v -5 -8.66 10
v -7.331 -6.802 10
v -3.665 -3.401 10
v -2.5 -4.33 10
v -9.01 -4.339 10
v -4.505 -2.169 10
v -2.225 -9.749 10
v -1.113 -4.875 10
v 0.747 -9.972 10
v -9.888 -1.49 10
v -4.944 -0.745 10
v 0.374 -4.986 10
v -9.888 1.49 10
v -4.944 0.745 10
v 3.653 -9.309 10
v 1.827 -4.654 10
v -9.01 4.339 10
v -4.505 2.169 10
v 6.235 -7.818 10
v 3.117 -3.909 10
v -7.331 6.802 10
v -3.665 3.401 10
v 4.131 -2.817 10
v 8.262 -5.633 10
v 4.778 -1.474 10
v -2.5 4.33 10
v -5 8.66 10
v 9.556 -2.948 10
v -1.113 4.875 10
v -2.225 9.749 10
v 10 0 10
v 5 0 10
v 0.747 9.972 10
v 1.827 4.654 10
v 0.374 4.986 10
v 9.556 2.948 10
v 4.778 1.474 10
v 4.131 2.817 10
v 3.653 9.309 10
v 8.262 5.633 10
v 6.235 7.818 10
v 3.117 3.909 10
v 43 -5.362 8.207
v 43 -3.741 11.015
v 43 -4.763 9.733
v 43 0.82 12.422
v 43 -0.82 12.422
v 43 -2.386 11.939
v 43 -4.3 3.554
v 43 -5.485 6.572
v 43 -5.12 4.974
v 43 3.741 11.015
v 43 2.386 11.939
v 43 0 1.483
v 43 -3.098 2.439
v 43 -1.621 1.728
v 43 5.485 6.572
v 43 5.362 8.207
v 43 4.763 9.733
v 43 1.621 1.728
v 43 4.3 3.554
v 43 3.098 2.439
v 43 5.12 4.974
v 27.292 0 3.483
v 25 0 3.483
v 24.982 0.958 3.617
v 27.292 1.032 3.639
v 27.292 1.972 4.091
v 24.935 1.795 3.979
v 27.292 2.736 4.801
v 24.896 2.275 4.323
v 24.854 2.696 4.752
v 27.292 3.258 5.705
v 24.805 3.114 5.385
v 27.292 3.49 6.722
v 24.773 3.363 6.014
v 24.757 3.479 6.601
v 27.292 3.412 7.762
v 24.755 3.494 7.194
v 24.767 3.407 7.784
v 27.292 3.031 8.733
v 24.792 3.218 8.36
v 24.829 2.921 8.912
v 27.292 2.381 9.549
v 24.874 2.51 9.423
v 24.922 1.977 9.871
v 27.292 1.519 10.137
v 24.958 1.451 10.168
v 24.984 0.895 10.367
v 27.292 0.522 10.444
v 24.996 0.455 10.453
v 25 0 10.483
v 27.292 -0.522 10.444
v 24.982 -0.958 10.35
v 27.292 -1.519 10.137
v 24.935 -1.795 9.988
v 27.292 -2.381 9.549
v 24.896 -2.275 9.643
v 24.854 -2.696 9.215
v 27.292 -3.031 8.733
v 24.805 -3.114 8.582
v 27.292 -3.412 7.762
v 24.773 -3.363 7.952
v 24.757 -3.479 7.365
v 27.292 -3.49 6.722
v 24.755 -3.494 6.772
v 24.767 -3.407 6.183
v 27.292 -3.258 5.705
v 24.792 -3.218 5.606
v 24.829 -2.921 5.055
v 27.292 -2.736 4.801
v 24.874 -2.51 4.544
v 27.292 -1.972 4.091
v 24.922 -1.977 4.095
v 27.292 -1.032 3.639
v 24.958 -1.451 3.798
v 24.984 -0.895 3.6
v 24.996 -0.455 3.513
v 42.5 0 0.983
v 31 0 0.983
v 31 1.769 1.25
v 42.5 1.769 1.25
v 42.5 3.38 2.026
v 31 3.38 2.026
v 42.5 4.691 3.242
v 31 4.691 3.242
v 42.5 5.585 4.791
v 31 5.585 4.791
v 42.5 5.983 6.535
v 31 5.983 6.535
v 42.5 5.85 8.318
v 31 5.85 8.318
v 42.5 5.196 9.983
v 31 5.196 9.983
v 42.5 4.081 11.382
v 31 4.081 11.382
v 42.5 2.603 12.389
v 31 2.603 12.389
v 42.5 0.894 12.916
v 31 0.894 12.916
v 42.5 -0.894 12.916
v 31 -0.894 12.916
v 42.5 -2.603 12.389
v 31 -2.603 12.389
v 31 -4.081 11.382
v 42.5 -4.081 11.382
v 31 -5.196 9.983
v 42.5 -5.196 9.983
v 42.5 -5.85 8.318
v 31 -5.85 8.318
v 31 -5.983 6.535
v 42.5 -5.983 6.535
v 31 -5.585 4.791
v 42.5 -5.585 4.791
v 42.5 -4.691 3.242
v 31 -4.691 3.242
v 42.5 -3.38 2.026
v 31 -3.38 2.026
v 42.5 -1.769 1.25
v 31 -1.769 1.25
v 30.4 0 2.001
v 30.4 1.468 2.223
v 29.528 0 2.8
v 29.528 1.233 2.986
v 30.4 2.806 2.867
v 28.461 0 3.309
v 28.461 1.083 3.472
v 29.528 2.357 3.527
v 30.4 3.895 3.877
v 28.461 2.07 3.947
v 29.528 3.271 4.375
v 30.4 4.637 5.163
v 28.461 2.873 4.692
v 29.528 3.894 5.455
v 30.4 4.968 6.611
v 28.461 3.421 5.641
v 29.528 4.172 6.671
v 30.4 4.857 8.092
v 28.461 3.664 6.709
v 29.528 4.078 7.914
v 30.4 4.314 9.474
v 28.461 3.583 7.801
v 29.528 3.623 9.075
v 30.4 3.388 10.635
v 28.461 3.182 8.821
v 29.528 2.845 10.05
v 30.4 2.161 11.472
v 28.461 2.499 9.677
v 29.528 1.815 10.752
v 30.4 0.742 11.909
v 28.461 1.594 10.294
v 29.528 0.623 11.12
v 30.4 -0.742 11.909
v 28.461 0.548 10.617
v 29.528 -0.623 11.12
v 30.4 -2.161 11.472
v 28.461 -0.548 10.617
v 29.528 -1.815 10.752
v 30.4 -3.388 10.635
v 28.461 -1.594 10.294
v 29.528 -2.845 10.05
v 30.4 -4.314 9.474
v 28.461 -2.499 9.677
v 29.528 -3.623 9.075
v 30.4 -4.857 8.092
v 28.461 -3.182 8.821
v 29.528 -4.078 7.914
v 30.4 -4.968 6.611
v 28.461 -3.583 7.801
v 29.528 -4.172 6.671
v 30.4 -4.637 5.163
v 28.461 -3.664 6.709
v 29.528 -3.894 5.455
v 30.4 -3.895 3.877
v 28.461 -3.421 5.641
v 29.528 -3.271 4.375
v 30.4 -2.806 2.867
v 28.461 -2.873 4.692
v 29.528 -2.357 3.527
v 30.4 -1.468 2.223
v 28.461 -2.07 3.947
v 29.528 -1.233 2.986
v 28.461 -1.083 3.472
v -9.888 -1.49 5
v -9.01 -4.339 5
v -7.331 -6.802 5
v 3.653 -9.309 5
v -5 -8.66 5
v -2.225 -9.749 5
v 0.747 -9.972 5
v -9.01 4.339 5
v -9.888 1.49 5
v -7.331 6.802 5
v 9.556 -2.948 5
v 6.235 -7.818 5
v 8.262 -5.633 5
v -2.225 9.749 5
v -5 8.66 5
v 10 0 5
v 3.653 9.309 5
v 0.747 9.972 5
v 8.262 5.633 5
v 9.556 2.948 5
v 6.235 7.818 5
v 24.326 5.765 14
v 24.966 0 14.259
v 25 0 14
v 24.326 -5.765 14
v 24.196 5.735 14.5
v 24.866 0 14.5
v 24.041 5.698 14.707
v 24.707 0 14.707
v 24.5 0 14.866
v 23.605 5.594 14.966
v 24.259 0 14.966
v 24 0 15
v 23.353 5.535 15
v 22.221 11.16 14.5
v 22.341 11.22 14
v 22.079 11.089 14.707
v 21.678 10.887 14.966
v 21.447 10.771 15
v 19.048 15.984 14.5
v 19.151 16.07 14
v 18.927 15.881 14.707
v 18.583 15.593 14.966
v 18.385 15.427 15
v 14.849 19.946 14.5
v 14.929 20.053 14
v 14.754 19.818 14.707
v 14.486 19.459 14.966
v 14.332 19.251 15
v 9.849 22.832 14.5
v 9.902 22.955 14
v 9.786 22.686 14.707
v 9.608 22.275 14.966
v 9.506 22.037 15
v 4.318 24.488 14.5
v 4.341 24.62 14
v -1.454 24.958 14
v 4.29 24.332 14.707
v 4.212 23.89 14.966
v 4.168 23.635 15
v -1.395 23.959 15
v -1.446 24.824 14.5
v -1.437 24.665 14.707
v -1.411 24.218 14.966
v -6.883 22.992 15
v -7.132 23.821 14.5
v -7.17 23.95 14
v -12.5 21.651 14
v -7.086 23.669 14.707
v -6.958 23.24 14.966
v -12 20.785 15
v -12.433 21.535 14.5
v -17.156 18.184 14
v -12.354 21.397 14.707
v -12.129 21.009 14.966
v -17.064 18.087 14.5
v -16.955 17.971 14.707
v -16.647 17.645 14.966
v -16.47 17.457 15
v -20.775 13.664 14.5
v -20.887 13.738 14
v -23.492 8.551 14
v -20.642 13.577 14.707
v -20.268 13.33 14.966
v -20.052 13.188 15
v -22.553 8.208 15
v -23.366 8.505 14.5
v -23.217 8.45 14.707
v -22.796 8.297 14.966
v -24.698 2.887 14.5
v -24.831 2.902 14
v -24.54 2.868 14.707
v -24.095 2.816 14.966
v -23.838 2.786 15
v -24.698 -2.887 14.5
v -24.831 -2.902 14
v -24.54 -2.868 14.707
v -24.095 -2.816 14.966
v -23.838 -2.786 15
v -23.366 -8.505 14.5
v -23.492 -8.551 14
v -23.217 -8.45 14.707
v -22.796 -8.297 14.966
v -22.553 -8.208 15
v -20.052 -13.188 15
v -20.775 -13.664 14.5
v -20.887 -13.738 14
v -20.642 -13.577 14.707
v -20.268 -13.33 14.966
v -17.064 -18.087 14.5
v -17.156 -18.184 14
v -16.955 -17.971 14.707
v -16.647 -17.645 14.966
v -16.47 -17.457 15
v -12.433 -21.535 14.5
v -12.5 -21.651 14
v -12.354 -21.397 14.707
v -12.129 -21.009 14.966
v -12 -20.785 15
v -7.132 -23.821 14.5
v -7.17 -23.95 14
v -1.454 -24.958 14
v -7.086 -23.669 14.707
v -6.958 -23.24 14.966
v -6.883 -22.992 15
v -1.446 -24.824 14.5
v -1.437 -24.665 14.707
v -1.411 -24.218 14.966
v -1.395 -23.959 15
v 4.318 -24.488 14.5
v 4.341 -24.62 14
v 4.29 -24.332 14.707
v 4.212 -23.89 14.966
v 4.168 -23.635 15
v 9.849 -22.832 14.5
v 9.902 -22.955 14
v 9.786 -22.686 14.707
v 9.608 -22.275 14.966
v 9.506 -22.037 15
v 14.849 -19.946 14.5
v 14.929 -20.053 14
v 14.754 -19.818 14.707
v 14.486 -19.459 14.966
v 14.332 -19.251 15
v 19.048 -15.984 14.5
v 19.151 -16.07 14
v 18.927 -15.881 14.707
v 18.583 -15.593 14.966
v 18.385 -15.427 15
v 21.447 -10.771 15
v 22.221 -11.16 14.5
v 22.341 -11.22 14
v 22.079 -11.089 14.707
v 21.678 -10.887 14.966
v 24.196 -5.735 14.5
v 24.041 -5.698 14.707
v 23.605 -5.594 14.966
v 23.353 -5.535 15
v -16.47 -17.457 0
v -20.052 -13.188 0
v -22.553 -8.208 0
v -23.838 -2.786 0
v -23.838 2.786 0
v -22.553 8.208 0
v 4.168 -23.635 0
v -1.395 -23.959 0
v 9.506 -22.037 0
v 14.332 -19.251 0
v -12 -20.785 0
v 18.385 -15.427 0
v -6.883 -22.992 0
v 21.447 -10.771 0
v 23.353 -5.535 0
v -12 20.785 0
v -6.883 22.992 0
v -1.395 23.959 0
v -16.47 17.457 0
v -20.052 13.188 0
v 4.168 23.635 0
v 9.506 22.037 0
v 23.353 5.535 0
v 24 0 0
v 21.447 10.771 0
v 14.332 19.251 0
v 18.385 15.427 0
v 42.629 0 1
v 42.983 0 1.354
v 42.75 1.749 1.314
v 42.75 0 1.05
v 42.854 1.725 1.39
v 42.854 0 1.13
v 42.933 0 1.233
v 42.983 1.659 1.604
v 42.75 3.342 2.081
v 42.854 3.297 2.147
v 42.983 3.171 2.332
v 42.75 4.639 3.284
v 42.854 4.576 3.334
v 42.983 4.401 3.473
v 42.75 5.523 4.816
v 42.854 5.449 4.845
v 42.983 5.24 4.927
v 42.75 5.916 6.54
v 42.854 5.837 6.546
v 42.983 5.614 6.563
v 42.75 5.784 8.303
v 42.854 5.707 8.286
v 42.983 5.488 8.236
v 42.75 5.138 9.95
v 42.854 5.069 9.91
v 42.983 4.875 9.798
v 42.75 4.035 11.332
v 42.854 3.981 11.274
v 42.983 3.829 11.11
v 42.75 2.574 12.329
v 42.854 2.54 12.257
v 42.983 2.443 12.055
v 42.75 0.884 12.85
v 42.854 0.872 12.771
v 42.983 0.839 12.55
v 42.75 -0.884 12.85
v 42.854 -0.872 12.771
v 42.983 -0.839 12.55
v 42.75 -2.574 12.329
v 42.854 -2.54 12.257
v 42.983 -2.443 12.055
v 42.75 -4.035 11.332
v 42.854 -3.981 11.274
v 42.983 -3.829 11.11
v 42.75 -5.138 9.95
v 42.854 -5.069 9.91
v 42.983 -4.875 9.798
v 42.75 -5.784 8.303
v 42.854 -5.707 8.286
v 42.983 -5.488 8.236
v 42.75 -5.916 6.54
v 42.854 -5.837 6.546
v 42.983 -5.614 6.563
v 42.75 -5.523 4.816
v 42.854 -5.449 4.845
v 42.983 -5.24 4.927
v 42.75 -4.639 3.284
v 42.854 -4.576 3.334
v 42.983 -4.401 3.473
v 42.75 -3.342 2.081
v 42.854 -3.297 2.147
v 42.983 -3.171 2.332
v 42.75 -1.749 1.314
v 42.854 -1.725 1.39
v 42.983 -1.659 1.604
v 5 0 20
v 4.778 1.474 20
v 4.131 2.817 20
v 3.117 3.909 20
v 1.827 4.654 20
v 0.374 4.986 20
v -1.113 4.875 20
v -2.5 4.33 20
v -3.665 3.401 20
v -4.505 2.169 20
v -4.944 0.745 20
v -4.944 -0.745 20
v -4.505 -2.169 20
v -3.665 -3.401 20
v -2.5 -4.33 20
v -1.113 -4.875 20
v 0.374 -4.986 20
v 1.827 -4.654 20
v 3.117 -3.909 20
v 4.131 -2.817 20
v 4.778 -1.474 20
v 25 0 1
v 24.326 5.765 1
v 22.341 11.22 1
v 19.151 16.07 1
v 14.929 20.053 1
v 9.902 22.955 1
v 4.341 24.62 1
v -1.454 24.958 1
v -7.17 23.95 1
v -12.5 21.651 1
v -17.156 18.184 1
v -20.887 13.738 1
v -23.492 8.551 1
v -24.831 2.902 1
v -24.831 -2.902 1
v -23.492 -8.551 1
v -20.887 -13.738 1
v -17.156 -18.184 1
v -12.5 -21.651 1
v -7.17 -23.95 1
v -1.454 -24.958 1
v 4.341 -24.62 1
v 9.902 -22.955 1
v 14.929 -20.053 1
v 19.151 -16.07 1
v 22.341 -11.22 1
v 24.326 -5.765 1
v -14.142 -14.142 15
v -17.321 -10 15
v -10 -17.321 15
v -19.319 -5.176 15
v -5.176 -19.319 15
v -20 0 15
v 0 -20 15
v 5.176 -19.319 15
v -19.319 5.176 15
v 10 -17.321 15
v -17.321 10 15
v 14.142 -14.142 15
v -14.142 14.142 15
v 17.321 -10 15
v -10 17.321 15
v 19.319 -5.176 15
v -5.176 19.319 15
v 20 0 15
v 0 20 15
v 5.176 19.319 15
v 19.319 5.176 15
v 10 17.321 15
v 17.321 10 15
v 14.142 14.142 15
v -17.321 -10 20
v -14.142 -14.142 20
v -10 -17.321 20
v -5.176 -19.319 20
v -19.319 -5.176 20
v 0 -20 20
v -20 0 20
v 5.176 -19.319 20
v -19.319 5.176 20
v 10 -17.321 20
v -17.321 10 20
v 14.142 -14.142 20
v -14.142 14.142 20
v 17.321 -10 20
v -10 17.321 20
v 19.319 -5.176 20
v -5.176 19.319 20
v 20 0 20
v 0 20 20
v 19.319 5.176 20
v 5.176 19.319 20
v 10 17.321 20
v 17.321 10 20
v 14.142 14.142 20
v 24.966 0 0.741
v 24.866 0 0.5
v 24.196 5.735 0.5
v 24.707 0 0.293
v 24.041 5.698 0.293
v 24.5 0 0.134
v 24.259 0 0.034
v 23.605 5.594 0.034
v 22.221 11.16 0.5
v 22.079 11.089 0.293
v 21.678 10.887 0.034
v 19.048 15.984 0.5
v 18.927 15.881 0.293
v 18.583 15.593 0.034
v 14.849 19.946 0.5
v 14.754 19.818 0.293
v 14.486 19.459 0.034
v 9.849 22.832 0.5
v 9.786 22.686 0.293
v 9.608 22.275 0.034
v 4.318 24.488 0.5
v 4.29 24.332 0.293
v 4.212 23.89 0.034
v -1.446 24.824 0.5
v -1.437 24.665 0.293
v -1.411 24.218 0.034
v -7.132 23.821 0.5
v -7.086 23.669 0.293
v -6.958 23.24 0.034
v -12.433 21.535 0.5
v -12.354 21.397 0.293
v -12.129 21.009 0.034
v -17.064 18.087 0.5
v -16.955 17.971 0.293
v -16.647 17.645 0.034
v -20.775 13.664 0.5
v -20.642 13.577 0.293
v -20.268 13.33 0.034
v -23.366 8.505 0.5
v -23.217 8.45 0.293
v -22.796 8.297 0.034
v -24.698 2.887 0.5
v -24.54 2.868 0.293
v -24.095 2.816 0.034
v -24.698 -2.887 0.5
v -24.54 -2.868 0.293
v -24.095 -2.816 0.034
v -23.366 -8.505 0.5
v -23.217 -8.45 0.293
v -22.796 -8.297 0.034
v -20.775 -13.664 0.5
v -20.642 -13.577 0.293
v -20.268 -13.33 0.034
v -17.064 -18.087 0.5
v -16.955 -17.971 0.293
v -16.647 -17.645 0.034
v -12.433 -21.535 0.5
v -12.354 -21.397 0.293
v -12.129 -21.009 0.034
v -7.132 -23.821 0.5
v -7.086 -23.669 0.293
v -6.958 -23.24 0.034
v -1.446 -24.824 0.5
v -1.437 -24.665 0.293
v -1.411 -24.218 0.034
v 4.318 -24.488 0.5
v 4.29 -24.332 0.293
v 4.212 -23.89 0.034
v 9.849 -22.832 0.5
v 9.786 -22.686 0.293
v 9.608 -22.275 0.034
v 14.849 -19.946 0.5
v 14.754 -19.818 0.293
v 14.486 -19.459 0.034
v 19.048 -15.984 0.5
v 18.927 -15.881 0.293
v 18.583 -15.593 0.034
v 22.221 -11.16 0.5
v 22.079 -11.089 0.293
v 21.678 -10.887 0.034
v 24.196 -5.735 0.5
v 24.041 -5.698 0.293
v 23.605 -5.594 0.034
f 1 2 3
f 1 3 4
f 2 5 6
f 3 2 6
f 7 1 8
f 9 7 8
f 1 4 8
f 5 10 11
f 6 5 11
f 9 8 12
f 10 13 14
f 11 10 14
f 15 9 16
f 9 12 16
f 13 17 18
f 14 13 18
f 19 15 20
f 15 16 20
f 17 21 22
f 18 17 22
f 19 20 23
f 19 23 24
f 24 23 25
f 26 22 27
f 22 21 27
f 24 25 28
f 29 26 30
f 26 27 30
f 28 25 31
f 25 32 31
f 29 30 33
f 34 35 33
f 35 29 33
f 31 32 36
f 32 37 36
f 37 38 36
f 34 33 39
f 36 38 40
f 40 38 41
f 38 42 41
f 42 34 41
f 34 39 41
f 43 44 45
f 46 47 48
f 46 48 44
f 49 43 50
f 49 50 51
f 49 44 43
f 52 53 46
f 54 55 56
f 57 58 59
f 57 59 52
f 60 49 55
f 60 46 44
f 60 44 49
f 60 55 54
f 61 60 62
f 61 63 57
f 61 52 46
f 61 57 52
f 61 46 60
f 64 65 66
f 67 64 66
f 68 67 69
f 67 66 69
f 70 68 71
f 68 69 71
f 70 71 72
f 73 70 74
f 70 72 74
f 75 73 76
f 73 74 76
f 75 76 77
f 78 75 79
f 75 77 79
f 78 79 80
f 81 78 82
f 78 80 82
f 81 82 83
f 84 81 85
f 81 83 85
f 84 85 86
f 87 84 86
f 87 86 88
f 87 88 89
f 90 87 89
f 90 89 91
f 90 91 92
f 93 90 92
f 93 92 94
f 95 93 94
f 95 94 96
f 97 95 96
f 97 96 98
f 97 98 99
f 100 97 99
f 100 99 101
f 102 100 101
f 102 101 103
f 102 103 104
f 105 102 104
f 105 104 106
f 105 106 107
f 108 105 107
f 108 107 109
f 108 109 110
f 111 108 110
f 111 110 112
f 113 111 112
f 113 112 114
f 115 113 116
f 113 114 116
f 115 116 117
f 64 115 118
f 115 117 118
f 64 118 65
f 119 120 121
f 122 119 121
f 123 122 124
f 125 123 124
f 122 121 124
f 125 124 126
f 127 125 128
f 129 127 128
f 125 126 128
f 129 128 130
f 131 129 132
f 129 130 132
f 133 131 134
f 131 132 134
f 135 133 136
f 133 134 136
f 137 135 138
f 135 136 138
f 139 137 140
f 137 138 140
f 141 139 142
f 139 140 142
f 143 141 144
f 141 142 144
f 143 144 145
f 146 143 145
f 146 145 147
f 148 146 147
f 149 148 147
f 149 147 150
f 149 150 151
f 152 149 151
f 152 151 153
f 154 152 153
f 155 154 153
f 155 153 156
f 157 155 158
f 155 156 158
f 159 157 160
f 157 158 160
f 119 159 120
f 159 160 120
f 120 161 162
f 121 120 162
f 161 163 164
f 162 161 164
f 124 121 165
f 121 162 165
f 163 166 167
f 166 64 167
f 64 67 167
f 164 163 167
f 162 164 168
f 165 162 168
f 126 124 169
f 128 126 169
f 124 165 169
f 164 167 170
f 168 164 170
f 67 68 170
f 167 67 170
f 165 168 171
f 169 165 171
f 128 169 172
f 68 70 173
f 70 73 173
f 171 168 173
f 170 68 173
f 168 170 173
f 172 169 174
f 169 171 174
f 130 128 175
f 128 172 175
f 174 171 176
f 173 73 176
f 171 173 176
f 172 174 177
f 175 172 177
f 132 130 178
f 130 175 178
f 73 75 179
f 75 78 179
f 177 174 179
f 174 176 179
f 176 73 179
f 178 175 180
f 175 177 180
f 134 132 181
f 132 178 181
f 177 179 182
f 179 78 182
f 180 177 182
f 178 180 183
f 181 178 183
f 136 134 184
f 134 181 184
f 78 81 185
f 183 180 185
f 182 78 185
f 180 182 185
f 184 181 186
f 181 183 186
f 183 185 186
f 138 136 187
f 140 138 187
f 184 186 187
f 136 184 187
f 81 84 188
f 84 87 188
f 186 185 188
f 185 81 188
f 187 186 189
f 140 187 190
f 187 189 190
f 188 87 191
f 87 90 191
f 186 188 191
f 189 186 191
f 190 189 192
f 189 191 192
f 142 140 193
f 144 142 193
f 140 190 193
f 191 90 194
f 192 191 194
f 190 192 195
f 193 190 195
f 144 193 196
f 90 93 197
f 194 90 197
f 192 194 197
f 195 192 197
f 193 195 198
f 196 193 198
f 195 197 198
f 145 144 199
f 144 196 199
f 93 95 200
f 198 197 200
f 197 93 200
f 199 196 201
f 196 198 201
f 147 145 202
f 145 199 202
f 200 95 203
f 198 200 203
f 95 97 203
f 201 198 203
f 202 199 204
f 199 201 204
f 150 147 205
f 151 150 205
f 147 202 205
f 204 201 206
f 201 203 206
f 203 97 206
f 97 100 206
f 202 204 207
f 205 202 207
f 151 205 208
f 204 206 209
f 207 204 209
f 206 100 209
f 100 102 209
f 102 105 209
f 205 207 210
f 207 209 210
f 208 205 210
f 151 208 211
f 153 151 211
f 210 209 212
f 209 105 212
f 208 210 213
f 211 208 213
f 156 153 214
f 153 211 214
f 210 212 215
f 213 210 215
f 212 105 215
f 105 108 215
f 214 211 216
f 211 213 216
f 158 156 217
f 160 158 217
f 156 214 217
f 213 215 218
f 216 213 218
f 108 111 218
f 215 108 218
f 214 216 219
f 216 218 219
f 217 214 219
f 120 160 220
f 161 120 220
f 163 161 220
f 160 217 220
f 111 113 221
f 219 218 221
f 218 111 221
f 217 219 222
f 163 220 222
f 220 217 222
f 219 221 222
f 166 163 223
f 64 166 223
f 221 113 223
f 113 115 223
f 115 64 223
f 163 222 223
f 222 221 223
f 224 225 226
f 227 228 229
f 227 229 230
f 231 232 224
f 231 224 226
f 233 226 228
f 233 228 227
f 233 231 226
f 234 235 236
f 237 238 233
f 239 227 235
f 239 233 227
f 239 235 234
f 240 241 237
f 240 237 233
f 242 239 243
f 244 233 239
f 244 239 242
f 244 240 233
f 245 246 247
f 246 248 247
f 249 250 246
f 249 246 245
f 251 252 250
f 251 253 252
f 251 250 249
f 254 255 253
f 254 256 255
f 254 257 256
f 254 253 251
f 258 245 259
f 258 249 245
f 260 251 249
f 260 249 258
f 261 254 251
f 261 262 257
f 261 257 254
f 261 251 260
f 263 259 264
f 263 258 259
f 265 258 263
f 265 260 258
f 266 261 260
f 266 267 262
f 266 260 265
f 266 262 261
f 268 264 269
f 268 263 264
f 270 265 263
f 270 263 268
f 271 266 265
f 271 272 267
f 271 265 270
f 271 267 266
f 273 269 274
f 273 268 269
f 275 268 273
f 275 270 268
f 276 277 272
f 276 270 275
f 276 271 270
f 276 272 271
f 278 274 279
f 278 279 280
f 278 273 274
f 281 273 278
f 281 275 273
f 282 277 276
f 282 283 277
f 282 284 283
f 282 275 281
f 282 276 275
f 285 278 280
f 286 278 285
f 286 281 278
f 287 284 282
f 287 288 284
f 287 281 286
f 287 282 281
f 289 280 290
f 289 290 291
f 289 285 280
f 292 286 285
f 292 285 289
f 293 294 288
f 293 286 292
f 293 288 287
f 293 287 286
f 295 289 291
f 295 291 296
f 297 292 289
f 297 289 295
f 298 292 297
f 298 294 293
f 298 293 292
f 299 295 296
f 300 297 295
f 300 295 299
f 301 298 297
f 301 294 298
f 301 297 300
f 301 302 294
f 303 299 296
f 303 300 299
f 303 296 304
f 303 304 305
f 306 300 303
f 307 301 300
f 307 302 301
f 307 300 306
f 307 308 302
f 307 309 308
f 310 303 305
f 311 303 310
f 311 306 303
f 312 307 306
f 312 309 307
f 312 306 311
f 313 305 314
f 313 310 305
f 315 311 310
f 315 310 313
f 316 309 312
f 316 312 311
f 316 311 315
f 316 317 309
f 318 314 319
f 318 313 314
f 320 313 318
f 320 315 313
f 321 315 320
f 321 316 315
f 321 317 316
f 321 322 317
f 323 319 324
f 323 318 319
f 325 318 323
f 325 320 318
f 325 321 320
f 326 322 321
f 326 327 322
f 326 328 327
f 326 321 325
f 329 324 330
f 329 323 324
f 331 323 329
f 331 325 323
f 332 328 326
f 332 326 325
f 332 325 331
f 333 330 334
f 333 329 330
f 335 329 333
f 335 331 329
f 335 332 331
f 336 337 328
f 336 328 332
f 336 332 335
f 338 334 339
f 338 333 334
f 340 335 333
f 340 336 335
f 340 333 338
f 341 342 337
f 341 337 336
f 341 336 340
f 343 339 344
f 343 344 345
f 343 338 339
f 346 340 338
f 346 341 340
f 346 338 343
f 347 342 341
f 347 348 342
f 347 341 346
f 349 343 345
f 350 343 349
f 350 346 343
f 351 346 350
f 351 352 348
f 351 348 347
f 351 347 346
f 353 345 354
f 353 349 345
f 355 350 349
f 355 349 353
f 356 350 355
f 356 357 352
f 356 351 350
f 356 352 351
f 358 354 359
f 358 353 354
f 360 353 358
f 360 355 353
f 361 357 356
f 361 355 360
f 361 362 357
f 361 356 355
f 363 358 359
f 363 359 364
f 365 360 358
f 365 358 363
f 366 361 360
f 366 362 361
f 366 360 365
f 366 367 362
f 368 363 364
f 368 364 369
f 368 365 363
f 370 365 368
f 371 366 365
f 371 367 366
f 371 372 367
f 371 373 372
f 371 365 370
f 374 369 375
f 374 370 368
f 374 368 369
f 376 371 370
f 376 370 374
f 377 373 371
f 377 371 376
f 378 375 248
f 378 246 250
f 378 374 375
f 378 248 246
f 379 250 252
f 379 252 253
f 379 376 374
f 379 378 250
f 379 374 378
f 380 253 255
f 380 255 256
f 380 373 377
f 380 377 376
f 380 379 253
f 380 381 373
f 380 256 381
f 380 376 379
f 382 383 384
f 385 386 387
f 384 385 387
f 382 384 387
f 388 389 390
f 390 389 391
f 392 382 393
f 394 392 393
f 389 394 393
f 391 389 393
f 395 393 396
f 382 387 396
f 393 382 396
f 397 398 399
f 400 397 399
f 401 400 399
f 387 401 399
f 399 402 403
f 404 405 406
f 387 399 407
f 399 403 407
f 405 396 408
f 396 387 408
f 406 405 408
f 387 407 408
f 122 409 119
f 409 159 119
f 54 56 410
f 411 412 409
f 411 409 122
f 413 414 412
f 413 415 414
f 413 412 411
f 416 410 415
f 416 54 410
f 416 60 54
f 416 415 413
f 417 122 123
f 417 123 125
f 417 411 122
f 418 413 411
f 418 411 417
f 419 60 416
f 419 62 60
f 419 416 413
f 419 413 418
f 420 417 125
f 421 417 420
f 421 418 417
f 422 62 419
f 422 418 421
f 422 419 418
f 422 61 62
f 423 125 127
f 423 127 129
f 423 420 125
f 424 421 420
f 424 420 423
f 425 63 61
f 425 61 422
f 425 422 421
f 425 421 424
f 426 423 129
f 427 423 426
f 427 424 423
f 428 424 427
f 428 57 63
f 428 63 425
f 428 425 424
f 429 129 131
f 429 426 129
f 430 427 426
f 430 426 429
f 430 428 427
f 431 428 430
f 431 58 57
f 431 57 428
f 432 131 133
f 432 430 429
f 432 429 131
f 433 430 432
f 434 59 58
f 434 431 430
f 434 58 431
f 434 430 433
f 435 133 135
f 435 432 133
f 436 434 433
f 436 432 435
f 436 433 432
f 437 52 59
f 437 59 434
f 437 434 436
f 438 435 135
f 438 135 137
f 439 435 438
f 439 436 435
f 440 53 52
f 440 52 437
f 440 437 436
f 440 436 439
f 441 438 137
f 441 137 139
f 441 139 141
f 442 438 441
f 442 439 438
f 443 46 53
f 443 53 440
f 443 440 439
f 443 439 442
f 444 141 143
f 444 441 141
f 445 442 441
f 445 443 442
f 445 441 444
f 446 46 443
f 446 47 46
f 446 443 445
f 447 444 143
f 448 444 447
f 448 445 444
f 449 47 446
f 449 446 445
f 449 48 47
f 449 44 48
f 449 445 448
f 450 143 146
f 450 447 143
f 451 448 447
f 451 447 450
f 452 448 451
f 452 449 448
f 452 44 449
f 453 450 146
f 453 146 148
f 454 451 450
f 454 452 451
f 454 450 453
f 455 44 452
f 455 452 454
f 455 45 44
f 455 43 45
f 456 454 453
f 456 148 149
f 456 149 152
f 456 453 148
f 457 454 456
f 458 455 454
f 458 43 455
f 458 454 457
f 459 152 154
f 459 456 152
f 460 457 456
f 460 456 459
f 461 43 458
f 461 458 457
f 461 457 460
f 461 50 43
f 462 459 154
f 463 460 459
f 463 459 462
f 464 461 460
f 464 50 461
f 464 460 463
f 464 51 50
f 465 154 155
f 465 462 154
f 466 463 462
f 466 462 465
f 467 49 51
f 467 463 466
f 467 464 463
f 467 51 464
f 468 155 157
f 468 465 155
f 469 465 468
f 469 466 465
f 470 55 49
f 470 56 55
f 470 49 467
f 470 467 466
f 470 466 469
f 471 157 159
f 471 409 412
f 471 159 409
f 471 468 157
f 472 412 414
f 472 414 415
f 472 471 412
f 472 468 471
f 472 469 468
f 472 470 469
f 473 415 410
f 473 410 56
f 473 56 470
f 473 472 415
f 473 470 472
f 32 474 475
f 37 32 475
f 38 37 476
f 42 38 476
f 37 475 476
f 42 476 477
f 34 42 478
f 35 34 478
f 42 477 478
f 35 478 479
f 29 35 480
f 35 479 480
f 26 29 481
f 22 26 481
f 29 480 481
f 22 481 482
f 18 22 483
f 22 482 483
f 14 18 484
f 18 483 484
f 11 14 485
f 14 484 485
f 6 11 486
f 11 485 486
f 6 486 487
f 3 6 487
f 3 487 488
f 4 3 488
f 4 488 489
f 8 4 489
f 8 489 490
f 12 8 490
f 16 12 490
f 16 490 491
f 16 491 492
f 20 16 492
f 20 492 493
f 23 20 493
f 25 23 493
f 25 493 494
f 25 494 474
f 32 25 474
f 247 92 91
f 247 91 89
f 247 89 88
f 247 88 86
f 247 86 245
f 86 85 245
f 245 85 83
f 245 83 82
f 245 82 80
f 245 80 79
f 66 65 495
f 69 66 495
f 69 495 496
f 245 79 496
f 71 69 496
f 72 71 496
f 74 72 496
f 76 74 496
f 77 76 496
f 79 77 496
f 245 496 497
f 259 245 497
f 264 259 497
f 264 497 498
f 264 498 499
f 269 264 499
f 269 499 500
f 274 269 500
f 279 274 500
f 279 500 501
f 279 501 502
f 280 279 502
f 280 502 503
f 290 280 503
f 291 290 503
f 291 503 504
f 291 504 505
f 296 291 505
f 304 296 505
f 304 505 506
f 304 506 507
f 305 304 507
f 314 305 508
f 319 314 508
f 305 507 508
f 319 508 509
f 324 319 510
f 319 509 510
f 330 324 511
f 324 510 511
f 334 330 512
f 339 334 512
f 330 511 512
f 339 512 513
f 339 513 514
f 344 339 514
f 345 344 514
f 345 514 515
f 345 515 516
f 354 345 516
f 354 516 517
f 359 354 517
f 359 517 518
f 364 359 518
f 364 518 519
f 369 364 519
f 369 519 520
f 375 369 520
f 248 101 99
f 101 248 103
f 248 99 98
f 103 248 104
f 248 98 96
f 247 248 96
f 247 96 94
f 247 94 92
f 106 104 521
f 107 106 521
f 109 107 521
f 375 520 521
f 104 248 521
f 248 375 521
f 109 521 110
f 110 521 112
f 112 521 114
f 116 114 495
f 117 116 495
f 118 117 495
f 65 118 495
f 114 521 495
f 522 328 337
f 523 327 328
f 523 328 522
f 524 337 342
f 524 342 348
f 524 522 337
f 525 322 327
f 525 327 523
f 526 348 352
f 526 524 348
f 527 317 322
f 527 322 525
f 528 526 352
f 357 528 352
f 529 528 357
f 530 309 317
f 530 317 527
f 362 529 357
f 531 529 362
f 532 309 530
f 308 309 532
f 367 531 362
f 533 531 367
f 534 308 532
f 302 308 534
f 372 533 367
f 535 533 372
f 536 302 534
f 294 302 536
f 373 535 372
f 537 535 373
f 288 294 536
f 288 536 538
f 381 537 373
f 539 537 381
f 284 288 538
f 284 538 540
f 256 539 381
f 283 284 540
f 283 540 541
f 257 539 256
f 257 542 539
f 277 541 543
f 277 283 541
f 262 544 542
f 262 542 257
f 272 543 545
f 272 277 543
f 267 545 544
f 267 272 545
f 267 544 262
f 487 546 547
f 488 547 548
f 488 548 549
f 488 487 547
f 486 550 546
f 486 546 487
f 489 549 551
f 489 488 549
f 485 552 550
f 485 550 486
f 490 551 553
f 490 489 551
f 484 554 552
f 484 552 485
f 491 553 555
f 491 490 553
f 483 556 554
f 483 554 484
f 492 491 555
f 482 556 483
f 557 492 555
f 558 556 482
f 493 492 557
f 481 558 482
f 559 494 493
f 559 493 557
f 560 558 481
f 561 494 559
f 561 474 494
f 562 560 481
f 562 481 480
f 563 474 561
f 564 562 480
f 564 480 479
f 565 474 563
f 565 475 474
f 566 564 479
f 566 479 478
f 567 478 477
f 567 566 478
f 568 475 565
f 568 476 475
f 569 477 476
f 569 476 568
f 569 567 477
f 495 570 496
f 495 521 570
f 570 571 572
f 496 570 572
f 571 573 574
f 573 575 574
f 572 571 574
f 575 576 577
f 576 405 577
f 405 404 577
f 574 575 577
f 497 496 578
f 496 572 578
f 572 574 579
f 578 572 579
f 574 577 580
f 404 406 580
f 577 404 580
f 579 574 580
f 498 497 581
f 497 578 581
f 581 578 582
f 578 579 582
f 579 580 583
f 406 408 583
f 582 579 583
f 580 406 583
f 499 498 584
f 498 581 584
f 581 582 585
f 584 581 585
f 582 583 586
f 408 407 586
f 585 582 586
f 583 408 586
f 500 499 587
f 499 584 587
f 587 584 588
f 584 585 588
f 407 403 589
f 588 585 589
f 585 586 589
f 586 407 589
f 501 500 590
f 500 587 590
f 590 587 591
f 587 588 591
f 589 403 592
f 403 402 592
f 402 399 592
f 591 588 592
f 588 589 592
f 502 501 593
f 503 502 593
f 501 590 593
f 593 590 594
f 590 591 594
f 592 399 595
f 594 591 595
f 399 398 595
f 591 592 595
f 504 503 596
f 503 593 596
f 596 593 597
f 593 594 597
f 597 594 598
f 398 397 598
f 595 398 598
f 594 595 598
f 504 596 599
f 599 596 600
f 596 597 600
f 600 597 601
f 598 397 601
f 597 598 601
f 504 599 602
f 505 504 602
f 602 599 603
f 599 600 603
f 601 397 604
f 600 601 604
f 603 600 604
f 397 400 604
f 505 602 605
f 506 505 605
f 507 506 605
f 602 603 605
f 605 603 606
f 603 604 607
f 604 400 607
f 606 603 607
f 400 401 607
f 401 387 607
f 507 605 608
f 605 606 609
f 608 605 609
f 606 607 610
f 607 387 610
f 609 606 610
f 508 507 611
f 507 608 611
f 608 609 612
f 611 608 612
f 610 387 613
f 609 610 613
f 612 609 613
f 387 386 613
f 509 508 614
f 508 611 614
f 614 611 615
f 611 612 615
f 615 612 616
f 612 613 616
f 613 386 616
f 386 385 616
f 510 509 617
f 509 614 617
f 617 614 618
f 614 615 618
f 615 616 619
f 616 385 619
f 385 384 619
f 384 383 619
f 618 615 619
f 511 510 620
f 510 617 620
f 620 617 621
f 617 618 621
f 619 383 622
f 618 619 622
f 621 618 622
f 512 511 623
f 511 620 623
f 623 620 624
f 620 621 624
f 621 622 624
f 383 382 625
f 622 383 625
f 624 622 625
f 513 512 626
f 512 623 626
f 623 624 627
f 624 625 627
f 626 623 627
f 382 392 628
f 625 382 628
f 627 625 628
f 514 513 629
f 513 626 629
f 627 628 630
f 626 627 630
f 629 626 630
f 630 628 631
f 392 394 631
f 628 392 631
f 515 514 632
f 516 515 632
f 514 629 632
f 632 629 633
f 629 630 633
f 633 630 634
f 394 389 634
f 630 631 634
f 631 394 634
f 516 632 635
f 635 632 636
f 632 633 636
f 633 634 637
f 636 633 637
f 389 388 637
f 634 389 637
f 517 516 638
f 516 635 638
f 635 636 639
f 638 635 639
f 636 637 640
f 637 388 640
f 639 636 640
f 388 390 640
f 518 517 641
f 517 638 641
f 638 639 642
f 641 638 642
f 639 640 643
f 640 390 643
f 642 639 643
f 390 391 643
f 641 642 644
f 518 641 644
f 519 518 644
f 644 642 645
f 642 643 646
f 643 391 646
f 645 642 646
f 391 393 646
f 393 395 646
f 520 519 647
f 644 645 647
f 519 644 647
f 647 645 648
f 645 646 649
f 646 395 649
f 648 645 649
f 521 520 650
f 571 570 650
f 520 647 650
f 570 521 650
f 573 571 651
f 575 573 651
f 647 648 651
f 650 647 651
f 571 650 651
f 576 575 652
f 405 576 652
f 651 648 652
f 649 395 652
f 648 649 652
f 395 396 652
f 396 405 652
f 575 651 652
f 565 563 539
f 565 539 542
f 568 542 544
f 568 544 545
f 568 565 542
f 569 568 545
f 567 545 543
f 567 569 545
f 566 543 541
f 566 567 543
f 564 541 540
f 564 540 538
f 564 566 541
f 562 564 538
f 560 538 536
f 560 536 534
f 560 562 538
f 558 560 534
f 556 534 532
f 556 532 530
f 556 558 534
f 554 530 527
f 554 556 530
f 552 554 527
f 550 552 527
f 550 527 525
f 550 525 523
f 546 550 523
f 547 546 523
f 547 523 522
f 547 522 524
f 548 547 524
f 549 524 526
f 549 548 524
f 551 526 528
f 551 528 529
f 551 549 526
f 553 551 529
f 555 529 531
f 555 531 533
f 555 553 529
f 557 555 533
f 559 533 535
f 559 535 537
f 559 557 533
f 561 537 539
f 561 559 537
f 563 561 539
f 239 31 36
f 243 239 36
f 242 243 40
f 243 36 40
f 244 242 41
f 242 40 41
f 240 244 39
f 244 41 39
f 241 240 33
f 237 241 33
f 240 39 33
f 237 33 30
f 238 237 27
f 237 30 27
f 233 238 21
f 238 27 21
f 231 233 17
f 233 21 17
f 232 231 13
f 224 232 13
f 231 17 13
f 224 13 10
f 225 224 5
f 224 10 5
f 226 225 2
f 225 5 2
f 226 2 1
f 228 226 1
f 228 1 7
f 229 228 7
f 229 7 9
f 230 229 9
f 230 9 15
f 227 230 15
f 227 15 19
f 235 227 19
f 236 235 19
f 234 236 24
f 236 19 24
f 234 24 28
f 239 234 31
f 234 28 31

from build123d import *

# Parameters (mm, degrees)
SKETCH_1_R          = 25
EXTRUDE_1_DEPTH     = 20
SKETCH_2_R          = 5
CUT_EXTRUDE_1_DEPTH = 10
SKETCH_3_R          = 10
CUT_EXTRUDE_2_DEPTH = 5
CUT_EXTRUDE_START   = -5
SKETCH_4_R          = 25
CUT_EXTRUDE_3_DEPTH = 5
EXTRUDE_START       = 5
SKETCH_5_R          = 20
SKETCH_5_R_2        = 5
EXTRUDE_2_DEPTH     = 5
SKETCH_6_R          = 3.5
EXTRUDE_3_DEPTH     = 7
SKETCH_7_R          = 6
EXTRUDE_4_DEPTH     = 12
FILLET_1_R          = 4
FILLET_2_R          = 0.5
FILLET_3_R          = 1
FILLET_4_R          = 1


with BuildPart() as part:
    # 草图1 → 凸台-拉伸1 (new body)
    with BuildSketch(Plane.XY):
        Circle(SKETCH_1_R)
    extrude(amount=EXTRUDE_1_DEPTH)

    # 草图2 → 切除-拉伸1 (cut)
    with BuildSketch(Plane.XY.offset(20)):
        Circle(SKETCH_2_R)
    extrude(amount=-CUT_EXTRUDE_1_DEPTH, mode=Mode.SUBTRACT)

    # 草图3 → 切除-拉伸2 (cut)
    with BuildSketch(Plane.XY.offset(10)):
        Circle(SKETCH_3_R)
    extrude(amount=-CUT_EXTRUDE_2_DEPTH, mode=Mode.SUBTRACT)

    # 草图4 → 切除-拉伸3 (cut)
    with BuildSketch(Plane.XY.offset(20).offset(CUT_EXTRUDE_START)):
        Circle(SKETCH_4_R)
    extrude(amount=CUT_EXTRUDE_3_DEPTH, mode=Mode.SUBTRACT)

    # 草图5 → 凸台-拉伸2 (add)
    with BuildSketch(Plane.XY.offset(15).offset(EXTRUDE_START)):
        Circle(SKETCH_5_R)
        Circle(SKETCH_5_R_2, mode=Mode.SUBTRACT)
    extrude(amount=-EXTRUDE_2_DEPTH)

    # 草图6 → 凸台-拉伸3 (add)
    with BuildSketch(Plane(origin=(24, 0, 0), x_dir=(0, 0, -1), z_dir=(1, 0, 0))):
        with Locations((-6.983226233, 0)):
            Circle(SKETCH_6_R)
    extrude(amount=EXTRUDE_3_DEPTH)

    # 草图7 → 凸台-拉伸4 (add)
    with BuildSketch(Plane(origin=(31, 0, 0), x_dir=(0, 0, -1), z_dir=(1, 0, 0))):
        with Locations((-6.983226233, 0)):
            Circle(SKETCH_7_R)
    extrude(amount=EXTRUDE_4_DEPTH)

    # 圆角1
    # the kernel refuses this fillet: 4 mm, written as the material it adds along each edge
    with BuildSketch(Plane(origin=(31, 0, 6.983226233), x_dir=(0, 0, -1), z_dir=(0, -1, 0))) as fillet_1_piece_1:
        with BuildLine():
            CenterArc((7.5, -3.708099244), FILLET_1_R, 112.024312837, 67.975687163)
            Line((3.5, -3.708099244), (3.42, -3.708099244))
            Line((3.42, -3.708099244), (3.42, 0))
            Line((3.42, 0), (3.5, 0.08))
            ThreePointArc((3.5, 0.08), (4.75, 0.08), (5.97, 0.074161985))
            Line((5.97, 0.074161985), (6, 0))
        make_face()
    revolve(axis=Axis((31, 0, 6.983226233), (1, 0, 0)))

    # 圆角2
    fillet_2_edges = [part.edges().sort_by_distance(p)[0] for p in [
        (43, 0, 12.983226233),
    ]]
    fillet(fillet_2_edges, radius=FILLET_2_R)

    # 圆角3
    fillet_3_edges = [part.edges().sort_by_distance(p)[0] for p in [
        (-25, 0, 0),
    ]]
    fillet(fillet_3_edges, radius=FILLET_3_R)

    # 圆角4
    fillet_4_edges = [part.edges().sort_by_distance(p)[0] for p in [
        (-25, 0, 15),
    ]]
    fillet(fillet_4_edges, radius=FILLET_4_R)


solid = part.part
